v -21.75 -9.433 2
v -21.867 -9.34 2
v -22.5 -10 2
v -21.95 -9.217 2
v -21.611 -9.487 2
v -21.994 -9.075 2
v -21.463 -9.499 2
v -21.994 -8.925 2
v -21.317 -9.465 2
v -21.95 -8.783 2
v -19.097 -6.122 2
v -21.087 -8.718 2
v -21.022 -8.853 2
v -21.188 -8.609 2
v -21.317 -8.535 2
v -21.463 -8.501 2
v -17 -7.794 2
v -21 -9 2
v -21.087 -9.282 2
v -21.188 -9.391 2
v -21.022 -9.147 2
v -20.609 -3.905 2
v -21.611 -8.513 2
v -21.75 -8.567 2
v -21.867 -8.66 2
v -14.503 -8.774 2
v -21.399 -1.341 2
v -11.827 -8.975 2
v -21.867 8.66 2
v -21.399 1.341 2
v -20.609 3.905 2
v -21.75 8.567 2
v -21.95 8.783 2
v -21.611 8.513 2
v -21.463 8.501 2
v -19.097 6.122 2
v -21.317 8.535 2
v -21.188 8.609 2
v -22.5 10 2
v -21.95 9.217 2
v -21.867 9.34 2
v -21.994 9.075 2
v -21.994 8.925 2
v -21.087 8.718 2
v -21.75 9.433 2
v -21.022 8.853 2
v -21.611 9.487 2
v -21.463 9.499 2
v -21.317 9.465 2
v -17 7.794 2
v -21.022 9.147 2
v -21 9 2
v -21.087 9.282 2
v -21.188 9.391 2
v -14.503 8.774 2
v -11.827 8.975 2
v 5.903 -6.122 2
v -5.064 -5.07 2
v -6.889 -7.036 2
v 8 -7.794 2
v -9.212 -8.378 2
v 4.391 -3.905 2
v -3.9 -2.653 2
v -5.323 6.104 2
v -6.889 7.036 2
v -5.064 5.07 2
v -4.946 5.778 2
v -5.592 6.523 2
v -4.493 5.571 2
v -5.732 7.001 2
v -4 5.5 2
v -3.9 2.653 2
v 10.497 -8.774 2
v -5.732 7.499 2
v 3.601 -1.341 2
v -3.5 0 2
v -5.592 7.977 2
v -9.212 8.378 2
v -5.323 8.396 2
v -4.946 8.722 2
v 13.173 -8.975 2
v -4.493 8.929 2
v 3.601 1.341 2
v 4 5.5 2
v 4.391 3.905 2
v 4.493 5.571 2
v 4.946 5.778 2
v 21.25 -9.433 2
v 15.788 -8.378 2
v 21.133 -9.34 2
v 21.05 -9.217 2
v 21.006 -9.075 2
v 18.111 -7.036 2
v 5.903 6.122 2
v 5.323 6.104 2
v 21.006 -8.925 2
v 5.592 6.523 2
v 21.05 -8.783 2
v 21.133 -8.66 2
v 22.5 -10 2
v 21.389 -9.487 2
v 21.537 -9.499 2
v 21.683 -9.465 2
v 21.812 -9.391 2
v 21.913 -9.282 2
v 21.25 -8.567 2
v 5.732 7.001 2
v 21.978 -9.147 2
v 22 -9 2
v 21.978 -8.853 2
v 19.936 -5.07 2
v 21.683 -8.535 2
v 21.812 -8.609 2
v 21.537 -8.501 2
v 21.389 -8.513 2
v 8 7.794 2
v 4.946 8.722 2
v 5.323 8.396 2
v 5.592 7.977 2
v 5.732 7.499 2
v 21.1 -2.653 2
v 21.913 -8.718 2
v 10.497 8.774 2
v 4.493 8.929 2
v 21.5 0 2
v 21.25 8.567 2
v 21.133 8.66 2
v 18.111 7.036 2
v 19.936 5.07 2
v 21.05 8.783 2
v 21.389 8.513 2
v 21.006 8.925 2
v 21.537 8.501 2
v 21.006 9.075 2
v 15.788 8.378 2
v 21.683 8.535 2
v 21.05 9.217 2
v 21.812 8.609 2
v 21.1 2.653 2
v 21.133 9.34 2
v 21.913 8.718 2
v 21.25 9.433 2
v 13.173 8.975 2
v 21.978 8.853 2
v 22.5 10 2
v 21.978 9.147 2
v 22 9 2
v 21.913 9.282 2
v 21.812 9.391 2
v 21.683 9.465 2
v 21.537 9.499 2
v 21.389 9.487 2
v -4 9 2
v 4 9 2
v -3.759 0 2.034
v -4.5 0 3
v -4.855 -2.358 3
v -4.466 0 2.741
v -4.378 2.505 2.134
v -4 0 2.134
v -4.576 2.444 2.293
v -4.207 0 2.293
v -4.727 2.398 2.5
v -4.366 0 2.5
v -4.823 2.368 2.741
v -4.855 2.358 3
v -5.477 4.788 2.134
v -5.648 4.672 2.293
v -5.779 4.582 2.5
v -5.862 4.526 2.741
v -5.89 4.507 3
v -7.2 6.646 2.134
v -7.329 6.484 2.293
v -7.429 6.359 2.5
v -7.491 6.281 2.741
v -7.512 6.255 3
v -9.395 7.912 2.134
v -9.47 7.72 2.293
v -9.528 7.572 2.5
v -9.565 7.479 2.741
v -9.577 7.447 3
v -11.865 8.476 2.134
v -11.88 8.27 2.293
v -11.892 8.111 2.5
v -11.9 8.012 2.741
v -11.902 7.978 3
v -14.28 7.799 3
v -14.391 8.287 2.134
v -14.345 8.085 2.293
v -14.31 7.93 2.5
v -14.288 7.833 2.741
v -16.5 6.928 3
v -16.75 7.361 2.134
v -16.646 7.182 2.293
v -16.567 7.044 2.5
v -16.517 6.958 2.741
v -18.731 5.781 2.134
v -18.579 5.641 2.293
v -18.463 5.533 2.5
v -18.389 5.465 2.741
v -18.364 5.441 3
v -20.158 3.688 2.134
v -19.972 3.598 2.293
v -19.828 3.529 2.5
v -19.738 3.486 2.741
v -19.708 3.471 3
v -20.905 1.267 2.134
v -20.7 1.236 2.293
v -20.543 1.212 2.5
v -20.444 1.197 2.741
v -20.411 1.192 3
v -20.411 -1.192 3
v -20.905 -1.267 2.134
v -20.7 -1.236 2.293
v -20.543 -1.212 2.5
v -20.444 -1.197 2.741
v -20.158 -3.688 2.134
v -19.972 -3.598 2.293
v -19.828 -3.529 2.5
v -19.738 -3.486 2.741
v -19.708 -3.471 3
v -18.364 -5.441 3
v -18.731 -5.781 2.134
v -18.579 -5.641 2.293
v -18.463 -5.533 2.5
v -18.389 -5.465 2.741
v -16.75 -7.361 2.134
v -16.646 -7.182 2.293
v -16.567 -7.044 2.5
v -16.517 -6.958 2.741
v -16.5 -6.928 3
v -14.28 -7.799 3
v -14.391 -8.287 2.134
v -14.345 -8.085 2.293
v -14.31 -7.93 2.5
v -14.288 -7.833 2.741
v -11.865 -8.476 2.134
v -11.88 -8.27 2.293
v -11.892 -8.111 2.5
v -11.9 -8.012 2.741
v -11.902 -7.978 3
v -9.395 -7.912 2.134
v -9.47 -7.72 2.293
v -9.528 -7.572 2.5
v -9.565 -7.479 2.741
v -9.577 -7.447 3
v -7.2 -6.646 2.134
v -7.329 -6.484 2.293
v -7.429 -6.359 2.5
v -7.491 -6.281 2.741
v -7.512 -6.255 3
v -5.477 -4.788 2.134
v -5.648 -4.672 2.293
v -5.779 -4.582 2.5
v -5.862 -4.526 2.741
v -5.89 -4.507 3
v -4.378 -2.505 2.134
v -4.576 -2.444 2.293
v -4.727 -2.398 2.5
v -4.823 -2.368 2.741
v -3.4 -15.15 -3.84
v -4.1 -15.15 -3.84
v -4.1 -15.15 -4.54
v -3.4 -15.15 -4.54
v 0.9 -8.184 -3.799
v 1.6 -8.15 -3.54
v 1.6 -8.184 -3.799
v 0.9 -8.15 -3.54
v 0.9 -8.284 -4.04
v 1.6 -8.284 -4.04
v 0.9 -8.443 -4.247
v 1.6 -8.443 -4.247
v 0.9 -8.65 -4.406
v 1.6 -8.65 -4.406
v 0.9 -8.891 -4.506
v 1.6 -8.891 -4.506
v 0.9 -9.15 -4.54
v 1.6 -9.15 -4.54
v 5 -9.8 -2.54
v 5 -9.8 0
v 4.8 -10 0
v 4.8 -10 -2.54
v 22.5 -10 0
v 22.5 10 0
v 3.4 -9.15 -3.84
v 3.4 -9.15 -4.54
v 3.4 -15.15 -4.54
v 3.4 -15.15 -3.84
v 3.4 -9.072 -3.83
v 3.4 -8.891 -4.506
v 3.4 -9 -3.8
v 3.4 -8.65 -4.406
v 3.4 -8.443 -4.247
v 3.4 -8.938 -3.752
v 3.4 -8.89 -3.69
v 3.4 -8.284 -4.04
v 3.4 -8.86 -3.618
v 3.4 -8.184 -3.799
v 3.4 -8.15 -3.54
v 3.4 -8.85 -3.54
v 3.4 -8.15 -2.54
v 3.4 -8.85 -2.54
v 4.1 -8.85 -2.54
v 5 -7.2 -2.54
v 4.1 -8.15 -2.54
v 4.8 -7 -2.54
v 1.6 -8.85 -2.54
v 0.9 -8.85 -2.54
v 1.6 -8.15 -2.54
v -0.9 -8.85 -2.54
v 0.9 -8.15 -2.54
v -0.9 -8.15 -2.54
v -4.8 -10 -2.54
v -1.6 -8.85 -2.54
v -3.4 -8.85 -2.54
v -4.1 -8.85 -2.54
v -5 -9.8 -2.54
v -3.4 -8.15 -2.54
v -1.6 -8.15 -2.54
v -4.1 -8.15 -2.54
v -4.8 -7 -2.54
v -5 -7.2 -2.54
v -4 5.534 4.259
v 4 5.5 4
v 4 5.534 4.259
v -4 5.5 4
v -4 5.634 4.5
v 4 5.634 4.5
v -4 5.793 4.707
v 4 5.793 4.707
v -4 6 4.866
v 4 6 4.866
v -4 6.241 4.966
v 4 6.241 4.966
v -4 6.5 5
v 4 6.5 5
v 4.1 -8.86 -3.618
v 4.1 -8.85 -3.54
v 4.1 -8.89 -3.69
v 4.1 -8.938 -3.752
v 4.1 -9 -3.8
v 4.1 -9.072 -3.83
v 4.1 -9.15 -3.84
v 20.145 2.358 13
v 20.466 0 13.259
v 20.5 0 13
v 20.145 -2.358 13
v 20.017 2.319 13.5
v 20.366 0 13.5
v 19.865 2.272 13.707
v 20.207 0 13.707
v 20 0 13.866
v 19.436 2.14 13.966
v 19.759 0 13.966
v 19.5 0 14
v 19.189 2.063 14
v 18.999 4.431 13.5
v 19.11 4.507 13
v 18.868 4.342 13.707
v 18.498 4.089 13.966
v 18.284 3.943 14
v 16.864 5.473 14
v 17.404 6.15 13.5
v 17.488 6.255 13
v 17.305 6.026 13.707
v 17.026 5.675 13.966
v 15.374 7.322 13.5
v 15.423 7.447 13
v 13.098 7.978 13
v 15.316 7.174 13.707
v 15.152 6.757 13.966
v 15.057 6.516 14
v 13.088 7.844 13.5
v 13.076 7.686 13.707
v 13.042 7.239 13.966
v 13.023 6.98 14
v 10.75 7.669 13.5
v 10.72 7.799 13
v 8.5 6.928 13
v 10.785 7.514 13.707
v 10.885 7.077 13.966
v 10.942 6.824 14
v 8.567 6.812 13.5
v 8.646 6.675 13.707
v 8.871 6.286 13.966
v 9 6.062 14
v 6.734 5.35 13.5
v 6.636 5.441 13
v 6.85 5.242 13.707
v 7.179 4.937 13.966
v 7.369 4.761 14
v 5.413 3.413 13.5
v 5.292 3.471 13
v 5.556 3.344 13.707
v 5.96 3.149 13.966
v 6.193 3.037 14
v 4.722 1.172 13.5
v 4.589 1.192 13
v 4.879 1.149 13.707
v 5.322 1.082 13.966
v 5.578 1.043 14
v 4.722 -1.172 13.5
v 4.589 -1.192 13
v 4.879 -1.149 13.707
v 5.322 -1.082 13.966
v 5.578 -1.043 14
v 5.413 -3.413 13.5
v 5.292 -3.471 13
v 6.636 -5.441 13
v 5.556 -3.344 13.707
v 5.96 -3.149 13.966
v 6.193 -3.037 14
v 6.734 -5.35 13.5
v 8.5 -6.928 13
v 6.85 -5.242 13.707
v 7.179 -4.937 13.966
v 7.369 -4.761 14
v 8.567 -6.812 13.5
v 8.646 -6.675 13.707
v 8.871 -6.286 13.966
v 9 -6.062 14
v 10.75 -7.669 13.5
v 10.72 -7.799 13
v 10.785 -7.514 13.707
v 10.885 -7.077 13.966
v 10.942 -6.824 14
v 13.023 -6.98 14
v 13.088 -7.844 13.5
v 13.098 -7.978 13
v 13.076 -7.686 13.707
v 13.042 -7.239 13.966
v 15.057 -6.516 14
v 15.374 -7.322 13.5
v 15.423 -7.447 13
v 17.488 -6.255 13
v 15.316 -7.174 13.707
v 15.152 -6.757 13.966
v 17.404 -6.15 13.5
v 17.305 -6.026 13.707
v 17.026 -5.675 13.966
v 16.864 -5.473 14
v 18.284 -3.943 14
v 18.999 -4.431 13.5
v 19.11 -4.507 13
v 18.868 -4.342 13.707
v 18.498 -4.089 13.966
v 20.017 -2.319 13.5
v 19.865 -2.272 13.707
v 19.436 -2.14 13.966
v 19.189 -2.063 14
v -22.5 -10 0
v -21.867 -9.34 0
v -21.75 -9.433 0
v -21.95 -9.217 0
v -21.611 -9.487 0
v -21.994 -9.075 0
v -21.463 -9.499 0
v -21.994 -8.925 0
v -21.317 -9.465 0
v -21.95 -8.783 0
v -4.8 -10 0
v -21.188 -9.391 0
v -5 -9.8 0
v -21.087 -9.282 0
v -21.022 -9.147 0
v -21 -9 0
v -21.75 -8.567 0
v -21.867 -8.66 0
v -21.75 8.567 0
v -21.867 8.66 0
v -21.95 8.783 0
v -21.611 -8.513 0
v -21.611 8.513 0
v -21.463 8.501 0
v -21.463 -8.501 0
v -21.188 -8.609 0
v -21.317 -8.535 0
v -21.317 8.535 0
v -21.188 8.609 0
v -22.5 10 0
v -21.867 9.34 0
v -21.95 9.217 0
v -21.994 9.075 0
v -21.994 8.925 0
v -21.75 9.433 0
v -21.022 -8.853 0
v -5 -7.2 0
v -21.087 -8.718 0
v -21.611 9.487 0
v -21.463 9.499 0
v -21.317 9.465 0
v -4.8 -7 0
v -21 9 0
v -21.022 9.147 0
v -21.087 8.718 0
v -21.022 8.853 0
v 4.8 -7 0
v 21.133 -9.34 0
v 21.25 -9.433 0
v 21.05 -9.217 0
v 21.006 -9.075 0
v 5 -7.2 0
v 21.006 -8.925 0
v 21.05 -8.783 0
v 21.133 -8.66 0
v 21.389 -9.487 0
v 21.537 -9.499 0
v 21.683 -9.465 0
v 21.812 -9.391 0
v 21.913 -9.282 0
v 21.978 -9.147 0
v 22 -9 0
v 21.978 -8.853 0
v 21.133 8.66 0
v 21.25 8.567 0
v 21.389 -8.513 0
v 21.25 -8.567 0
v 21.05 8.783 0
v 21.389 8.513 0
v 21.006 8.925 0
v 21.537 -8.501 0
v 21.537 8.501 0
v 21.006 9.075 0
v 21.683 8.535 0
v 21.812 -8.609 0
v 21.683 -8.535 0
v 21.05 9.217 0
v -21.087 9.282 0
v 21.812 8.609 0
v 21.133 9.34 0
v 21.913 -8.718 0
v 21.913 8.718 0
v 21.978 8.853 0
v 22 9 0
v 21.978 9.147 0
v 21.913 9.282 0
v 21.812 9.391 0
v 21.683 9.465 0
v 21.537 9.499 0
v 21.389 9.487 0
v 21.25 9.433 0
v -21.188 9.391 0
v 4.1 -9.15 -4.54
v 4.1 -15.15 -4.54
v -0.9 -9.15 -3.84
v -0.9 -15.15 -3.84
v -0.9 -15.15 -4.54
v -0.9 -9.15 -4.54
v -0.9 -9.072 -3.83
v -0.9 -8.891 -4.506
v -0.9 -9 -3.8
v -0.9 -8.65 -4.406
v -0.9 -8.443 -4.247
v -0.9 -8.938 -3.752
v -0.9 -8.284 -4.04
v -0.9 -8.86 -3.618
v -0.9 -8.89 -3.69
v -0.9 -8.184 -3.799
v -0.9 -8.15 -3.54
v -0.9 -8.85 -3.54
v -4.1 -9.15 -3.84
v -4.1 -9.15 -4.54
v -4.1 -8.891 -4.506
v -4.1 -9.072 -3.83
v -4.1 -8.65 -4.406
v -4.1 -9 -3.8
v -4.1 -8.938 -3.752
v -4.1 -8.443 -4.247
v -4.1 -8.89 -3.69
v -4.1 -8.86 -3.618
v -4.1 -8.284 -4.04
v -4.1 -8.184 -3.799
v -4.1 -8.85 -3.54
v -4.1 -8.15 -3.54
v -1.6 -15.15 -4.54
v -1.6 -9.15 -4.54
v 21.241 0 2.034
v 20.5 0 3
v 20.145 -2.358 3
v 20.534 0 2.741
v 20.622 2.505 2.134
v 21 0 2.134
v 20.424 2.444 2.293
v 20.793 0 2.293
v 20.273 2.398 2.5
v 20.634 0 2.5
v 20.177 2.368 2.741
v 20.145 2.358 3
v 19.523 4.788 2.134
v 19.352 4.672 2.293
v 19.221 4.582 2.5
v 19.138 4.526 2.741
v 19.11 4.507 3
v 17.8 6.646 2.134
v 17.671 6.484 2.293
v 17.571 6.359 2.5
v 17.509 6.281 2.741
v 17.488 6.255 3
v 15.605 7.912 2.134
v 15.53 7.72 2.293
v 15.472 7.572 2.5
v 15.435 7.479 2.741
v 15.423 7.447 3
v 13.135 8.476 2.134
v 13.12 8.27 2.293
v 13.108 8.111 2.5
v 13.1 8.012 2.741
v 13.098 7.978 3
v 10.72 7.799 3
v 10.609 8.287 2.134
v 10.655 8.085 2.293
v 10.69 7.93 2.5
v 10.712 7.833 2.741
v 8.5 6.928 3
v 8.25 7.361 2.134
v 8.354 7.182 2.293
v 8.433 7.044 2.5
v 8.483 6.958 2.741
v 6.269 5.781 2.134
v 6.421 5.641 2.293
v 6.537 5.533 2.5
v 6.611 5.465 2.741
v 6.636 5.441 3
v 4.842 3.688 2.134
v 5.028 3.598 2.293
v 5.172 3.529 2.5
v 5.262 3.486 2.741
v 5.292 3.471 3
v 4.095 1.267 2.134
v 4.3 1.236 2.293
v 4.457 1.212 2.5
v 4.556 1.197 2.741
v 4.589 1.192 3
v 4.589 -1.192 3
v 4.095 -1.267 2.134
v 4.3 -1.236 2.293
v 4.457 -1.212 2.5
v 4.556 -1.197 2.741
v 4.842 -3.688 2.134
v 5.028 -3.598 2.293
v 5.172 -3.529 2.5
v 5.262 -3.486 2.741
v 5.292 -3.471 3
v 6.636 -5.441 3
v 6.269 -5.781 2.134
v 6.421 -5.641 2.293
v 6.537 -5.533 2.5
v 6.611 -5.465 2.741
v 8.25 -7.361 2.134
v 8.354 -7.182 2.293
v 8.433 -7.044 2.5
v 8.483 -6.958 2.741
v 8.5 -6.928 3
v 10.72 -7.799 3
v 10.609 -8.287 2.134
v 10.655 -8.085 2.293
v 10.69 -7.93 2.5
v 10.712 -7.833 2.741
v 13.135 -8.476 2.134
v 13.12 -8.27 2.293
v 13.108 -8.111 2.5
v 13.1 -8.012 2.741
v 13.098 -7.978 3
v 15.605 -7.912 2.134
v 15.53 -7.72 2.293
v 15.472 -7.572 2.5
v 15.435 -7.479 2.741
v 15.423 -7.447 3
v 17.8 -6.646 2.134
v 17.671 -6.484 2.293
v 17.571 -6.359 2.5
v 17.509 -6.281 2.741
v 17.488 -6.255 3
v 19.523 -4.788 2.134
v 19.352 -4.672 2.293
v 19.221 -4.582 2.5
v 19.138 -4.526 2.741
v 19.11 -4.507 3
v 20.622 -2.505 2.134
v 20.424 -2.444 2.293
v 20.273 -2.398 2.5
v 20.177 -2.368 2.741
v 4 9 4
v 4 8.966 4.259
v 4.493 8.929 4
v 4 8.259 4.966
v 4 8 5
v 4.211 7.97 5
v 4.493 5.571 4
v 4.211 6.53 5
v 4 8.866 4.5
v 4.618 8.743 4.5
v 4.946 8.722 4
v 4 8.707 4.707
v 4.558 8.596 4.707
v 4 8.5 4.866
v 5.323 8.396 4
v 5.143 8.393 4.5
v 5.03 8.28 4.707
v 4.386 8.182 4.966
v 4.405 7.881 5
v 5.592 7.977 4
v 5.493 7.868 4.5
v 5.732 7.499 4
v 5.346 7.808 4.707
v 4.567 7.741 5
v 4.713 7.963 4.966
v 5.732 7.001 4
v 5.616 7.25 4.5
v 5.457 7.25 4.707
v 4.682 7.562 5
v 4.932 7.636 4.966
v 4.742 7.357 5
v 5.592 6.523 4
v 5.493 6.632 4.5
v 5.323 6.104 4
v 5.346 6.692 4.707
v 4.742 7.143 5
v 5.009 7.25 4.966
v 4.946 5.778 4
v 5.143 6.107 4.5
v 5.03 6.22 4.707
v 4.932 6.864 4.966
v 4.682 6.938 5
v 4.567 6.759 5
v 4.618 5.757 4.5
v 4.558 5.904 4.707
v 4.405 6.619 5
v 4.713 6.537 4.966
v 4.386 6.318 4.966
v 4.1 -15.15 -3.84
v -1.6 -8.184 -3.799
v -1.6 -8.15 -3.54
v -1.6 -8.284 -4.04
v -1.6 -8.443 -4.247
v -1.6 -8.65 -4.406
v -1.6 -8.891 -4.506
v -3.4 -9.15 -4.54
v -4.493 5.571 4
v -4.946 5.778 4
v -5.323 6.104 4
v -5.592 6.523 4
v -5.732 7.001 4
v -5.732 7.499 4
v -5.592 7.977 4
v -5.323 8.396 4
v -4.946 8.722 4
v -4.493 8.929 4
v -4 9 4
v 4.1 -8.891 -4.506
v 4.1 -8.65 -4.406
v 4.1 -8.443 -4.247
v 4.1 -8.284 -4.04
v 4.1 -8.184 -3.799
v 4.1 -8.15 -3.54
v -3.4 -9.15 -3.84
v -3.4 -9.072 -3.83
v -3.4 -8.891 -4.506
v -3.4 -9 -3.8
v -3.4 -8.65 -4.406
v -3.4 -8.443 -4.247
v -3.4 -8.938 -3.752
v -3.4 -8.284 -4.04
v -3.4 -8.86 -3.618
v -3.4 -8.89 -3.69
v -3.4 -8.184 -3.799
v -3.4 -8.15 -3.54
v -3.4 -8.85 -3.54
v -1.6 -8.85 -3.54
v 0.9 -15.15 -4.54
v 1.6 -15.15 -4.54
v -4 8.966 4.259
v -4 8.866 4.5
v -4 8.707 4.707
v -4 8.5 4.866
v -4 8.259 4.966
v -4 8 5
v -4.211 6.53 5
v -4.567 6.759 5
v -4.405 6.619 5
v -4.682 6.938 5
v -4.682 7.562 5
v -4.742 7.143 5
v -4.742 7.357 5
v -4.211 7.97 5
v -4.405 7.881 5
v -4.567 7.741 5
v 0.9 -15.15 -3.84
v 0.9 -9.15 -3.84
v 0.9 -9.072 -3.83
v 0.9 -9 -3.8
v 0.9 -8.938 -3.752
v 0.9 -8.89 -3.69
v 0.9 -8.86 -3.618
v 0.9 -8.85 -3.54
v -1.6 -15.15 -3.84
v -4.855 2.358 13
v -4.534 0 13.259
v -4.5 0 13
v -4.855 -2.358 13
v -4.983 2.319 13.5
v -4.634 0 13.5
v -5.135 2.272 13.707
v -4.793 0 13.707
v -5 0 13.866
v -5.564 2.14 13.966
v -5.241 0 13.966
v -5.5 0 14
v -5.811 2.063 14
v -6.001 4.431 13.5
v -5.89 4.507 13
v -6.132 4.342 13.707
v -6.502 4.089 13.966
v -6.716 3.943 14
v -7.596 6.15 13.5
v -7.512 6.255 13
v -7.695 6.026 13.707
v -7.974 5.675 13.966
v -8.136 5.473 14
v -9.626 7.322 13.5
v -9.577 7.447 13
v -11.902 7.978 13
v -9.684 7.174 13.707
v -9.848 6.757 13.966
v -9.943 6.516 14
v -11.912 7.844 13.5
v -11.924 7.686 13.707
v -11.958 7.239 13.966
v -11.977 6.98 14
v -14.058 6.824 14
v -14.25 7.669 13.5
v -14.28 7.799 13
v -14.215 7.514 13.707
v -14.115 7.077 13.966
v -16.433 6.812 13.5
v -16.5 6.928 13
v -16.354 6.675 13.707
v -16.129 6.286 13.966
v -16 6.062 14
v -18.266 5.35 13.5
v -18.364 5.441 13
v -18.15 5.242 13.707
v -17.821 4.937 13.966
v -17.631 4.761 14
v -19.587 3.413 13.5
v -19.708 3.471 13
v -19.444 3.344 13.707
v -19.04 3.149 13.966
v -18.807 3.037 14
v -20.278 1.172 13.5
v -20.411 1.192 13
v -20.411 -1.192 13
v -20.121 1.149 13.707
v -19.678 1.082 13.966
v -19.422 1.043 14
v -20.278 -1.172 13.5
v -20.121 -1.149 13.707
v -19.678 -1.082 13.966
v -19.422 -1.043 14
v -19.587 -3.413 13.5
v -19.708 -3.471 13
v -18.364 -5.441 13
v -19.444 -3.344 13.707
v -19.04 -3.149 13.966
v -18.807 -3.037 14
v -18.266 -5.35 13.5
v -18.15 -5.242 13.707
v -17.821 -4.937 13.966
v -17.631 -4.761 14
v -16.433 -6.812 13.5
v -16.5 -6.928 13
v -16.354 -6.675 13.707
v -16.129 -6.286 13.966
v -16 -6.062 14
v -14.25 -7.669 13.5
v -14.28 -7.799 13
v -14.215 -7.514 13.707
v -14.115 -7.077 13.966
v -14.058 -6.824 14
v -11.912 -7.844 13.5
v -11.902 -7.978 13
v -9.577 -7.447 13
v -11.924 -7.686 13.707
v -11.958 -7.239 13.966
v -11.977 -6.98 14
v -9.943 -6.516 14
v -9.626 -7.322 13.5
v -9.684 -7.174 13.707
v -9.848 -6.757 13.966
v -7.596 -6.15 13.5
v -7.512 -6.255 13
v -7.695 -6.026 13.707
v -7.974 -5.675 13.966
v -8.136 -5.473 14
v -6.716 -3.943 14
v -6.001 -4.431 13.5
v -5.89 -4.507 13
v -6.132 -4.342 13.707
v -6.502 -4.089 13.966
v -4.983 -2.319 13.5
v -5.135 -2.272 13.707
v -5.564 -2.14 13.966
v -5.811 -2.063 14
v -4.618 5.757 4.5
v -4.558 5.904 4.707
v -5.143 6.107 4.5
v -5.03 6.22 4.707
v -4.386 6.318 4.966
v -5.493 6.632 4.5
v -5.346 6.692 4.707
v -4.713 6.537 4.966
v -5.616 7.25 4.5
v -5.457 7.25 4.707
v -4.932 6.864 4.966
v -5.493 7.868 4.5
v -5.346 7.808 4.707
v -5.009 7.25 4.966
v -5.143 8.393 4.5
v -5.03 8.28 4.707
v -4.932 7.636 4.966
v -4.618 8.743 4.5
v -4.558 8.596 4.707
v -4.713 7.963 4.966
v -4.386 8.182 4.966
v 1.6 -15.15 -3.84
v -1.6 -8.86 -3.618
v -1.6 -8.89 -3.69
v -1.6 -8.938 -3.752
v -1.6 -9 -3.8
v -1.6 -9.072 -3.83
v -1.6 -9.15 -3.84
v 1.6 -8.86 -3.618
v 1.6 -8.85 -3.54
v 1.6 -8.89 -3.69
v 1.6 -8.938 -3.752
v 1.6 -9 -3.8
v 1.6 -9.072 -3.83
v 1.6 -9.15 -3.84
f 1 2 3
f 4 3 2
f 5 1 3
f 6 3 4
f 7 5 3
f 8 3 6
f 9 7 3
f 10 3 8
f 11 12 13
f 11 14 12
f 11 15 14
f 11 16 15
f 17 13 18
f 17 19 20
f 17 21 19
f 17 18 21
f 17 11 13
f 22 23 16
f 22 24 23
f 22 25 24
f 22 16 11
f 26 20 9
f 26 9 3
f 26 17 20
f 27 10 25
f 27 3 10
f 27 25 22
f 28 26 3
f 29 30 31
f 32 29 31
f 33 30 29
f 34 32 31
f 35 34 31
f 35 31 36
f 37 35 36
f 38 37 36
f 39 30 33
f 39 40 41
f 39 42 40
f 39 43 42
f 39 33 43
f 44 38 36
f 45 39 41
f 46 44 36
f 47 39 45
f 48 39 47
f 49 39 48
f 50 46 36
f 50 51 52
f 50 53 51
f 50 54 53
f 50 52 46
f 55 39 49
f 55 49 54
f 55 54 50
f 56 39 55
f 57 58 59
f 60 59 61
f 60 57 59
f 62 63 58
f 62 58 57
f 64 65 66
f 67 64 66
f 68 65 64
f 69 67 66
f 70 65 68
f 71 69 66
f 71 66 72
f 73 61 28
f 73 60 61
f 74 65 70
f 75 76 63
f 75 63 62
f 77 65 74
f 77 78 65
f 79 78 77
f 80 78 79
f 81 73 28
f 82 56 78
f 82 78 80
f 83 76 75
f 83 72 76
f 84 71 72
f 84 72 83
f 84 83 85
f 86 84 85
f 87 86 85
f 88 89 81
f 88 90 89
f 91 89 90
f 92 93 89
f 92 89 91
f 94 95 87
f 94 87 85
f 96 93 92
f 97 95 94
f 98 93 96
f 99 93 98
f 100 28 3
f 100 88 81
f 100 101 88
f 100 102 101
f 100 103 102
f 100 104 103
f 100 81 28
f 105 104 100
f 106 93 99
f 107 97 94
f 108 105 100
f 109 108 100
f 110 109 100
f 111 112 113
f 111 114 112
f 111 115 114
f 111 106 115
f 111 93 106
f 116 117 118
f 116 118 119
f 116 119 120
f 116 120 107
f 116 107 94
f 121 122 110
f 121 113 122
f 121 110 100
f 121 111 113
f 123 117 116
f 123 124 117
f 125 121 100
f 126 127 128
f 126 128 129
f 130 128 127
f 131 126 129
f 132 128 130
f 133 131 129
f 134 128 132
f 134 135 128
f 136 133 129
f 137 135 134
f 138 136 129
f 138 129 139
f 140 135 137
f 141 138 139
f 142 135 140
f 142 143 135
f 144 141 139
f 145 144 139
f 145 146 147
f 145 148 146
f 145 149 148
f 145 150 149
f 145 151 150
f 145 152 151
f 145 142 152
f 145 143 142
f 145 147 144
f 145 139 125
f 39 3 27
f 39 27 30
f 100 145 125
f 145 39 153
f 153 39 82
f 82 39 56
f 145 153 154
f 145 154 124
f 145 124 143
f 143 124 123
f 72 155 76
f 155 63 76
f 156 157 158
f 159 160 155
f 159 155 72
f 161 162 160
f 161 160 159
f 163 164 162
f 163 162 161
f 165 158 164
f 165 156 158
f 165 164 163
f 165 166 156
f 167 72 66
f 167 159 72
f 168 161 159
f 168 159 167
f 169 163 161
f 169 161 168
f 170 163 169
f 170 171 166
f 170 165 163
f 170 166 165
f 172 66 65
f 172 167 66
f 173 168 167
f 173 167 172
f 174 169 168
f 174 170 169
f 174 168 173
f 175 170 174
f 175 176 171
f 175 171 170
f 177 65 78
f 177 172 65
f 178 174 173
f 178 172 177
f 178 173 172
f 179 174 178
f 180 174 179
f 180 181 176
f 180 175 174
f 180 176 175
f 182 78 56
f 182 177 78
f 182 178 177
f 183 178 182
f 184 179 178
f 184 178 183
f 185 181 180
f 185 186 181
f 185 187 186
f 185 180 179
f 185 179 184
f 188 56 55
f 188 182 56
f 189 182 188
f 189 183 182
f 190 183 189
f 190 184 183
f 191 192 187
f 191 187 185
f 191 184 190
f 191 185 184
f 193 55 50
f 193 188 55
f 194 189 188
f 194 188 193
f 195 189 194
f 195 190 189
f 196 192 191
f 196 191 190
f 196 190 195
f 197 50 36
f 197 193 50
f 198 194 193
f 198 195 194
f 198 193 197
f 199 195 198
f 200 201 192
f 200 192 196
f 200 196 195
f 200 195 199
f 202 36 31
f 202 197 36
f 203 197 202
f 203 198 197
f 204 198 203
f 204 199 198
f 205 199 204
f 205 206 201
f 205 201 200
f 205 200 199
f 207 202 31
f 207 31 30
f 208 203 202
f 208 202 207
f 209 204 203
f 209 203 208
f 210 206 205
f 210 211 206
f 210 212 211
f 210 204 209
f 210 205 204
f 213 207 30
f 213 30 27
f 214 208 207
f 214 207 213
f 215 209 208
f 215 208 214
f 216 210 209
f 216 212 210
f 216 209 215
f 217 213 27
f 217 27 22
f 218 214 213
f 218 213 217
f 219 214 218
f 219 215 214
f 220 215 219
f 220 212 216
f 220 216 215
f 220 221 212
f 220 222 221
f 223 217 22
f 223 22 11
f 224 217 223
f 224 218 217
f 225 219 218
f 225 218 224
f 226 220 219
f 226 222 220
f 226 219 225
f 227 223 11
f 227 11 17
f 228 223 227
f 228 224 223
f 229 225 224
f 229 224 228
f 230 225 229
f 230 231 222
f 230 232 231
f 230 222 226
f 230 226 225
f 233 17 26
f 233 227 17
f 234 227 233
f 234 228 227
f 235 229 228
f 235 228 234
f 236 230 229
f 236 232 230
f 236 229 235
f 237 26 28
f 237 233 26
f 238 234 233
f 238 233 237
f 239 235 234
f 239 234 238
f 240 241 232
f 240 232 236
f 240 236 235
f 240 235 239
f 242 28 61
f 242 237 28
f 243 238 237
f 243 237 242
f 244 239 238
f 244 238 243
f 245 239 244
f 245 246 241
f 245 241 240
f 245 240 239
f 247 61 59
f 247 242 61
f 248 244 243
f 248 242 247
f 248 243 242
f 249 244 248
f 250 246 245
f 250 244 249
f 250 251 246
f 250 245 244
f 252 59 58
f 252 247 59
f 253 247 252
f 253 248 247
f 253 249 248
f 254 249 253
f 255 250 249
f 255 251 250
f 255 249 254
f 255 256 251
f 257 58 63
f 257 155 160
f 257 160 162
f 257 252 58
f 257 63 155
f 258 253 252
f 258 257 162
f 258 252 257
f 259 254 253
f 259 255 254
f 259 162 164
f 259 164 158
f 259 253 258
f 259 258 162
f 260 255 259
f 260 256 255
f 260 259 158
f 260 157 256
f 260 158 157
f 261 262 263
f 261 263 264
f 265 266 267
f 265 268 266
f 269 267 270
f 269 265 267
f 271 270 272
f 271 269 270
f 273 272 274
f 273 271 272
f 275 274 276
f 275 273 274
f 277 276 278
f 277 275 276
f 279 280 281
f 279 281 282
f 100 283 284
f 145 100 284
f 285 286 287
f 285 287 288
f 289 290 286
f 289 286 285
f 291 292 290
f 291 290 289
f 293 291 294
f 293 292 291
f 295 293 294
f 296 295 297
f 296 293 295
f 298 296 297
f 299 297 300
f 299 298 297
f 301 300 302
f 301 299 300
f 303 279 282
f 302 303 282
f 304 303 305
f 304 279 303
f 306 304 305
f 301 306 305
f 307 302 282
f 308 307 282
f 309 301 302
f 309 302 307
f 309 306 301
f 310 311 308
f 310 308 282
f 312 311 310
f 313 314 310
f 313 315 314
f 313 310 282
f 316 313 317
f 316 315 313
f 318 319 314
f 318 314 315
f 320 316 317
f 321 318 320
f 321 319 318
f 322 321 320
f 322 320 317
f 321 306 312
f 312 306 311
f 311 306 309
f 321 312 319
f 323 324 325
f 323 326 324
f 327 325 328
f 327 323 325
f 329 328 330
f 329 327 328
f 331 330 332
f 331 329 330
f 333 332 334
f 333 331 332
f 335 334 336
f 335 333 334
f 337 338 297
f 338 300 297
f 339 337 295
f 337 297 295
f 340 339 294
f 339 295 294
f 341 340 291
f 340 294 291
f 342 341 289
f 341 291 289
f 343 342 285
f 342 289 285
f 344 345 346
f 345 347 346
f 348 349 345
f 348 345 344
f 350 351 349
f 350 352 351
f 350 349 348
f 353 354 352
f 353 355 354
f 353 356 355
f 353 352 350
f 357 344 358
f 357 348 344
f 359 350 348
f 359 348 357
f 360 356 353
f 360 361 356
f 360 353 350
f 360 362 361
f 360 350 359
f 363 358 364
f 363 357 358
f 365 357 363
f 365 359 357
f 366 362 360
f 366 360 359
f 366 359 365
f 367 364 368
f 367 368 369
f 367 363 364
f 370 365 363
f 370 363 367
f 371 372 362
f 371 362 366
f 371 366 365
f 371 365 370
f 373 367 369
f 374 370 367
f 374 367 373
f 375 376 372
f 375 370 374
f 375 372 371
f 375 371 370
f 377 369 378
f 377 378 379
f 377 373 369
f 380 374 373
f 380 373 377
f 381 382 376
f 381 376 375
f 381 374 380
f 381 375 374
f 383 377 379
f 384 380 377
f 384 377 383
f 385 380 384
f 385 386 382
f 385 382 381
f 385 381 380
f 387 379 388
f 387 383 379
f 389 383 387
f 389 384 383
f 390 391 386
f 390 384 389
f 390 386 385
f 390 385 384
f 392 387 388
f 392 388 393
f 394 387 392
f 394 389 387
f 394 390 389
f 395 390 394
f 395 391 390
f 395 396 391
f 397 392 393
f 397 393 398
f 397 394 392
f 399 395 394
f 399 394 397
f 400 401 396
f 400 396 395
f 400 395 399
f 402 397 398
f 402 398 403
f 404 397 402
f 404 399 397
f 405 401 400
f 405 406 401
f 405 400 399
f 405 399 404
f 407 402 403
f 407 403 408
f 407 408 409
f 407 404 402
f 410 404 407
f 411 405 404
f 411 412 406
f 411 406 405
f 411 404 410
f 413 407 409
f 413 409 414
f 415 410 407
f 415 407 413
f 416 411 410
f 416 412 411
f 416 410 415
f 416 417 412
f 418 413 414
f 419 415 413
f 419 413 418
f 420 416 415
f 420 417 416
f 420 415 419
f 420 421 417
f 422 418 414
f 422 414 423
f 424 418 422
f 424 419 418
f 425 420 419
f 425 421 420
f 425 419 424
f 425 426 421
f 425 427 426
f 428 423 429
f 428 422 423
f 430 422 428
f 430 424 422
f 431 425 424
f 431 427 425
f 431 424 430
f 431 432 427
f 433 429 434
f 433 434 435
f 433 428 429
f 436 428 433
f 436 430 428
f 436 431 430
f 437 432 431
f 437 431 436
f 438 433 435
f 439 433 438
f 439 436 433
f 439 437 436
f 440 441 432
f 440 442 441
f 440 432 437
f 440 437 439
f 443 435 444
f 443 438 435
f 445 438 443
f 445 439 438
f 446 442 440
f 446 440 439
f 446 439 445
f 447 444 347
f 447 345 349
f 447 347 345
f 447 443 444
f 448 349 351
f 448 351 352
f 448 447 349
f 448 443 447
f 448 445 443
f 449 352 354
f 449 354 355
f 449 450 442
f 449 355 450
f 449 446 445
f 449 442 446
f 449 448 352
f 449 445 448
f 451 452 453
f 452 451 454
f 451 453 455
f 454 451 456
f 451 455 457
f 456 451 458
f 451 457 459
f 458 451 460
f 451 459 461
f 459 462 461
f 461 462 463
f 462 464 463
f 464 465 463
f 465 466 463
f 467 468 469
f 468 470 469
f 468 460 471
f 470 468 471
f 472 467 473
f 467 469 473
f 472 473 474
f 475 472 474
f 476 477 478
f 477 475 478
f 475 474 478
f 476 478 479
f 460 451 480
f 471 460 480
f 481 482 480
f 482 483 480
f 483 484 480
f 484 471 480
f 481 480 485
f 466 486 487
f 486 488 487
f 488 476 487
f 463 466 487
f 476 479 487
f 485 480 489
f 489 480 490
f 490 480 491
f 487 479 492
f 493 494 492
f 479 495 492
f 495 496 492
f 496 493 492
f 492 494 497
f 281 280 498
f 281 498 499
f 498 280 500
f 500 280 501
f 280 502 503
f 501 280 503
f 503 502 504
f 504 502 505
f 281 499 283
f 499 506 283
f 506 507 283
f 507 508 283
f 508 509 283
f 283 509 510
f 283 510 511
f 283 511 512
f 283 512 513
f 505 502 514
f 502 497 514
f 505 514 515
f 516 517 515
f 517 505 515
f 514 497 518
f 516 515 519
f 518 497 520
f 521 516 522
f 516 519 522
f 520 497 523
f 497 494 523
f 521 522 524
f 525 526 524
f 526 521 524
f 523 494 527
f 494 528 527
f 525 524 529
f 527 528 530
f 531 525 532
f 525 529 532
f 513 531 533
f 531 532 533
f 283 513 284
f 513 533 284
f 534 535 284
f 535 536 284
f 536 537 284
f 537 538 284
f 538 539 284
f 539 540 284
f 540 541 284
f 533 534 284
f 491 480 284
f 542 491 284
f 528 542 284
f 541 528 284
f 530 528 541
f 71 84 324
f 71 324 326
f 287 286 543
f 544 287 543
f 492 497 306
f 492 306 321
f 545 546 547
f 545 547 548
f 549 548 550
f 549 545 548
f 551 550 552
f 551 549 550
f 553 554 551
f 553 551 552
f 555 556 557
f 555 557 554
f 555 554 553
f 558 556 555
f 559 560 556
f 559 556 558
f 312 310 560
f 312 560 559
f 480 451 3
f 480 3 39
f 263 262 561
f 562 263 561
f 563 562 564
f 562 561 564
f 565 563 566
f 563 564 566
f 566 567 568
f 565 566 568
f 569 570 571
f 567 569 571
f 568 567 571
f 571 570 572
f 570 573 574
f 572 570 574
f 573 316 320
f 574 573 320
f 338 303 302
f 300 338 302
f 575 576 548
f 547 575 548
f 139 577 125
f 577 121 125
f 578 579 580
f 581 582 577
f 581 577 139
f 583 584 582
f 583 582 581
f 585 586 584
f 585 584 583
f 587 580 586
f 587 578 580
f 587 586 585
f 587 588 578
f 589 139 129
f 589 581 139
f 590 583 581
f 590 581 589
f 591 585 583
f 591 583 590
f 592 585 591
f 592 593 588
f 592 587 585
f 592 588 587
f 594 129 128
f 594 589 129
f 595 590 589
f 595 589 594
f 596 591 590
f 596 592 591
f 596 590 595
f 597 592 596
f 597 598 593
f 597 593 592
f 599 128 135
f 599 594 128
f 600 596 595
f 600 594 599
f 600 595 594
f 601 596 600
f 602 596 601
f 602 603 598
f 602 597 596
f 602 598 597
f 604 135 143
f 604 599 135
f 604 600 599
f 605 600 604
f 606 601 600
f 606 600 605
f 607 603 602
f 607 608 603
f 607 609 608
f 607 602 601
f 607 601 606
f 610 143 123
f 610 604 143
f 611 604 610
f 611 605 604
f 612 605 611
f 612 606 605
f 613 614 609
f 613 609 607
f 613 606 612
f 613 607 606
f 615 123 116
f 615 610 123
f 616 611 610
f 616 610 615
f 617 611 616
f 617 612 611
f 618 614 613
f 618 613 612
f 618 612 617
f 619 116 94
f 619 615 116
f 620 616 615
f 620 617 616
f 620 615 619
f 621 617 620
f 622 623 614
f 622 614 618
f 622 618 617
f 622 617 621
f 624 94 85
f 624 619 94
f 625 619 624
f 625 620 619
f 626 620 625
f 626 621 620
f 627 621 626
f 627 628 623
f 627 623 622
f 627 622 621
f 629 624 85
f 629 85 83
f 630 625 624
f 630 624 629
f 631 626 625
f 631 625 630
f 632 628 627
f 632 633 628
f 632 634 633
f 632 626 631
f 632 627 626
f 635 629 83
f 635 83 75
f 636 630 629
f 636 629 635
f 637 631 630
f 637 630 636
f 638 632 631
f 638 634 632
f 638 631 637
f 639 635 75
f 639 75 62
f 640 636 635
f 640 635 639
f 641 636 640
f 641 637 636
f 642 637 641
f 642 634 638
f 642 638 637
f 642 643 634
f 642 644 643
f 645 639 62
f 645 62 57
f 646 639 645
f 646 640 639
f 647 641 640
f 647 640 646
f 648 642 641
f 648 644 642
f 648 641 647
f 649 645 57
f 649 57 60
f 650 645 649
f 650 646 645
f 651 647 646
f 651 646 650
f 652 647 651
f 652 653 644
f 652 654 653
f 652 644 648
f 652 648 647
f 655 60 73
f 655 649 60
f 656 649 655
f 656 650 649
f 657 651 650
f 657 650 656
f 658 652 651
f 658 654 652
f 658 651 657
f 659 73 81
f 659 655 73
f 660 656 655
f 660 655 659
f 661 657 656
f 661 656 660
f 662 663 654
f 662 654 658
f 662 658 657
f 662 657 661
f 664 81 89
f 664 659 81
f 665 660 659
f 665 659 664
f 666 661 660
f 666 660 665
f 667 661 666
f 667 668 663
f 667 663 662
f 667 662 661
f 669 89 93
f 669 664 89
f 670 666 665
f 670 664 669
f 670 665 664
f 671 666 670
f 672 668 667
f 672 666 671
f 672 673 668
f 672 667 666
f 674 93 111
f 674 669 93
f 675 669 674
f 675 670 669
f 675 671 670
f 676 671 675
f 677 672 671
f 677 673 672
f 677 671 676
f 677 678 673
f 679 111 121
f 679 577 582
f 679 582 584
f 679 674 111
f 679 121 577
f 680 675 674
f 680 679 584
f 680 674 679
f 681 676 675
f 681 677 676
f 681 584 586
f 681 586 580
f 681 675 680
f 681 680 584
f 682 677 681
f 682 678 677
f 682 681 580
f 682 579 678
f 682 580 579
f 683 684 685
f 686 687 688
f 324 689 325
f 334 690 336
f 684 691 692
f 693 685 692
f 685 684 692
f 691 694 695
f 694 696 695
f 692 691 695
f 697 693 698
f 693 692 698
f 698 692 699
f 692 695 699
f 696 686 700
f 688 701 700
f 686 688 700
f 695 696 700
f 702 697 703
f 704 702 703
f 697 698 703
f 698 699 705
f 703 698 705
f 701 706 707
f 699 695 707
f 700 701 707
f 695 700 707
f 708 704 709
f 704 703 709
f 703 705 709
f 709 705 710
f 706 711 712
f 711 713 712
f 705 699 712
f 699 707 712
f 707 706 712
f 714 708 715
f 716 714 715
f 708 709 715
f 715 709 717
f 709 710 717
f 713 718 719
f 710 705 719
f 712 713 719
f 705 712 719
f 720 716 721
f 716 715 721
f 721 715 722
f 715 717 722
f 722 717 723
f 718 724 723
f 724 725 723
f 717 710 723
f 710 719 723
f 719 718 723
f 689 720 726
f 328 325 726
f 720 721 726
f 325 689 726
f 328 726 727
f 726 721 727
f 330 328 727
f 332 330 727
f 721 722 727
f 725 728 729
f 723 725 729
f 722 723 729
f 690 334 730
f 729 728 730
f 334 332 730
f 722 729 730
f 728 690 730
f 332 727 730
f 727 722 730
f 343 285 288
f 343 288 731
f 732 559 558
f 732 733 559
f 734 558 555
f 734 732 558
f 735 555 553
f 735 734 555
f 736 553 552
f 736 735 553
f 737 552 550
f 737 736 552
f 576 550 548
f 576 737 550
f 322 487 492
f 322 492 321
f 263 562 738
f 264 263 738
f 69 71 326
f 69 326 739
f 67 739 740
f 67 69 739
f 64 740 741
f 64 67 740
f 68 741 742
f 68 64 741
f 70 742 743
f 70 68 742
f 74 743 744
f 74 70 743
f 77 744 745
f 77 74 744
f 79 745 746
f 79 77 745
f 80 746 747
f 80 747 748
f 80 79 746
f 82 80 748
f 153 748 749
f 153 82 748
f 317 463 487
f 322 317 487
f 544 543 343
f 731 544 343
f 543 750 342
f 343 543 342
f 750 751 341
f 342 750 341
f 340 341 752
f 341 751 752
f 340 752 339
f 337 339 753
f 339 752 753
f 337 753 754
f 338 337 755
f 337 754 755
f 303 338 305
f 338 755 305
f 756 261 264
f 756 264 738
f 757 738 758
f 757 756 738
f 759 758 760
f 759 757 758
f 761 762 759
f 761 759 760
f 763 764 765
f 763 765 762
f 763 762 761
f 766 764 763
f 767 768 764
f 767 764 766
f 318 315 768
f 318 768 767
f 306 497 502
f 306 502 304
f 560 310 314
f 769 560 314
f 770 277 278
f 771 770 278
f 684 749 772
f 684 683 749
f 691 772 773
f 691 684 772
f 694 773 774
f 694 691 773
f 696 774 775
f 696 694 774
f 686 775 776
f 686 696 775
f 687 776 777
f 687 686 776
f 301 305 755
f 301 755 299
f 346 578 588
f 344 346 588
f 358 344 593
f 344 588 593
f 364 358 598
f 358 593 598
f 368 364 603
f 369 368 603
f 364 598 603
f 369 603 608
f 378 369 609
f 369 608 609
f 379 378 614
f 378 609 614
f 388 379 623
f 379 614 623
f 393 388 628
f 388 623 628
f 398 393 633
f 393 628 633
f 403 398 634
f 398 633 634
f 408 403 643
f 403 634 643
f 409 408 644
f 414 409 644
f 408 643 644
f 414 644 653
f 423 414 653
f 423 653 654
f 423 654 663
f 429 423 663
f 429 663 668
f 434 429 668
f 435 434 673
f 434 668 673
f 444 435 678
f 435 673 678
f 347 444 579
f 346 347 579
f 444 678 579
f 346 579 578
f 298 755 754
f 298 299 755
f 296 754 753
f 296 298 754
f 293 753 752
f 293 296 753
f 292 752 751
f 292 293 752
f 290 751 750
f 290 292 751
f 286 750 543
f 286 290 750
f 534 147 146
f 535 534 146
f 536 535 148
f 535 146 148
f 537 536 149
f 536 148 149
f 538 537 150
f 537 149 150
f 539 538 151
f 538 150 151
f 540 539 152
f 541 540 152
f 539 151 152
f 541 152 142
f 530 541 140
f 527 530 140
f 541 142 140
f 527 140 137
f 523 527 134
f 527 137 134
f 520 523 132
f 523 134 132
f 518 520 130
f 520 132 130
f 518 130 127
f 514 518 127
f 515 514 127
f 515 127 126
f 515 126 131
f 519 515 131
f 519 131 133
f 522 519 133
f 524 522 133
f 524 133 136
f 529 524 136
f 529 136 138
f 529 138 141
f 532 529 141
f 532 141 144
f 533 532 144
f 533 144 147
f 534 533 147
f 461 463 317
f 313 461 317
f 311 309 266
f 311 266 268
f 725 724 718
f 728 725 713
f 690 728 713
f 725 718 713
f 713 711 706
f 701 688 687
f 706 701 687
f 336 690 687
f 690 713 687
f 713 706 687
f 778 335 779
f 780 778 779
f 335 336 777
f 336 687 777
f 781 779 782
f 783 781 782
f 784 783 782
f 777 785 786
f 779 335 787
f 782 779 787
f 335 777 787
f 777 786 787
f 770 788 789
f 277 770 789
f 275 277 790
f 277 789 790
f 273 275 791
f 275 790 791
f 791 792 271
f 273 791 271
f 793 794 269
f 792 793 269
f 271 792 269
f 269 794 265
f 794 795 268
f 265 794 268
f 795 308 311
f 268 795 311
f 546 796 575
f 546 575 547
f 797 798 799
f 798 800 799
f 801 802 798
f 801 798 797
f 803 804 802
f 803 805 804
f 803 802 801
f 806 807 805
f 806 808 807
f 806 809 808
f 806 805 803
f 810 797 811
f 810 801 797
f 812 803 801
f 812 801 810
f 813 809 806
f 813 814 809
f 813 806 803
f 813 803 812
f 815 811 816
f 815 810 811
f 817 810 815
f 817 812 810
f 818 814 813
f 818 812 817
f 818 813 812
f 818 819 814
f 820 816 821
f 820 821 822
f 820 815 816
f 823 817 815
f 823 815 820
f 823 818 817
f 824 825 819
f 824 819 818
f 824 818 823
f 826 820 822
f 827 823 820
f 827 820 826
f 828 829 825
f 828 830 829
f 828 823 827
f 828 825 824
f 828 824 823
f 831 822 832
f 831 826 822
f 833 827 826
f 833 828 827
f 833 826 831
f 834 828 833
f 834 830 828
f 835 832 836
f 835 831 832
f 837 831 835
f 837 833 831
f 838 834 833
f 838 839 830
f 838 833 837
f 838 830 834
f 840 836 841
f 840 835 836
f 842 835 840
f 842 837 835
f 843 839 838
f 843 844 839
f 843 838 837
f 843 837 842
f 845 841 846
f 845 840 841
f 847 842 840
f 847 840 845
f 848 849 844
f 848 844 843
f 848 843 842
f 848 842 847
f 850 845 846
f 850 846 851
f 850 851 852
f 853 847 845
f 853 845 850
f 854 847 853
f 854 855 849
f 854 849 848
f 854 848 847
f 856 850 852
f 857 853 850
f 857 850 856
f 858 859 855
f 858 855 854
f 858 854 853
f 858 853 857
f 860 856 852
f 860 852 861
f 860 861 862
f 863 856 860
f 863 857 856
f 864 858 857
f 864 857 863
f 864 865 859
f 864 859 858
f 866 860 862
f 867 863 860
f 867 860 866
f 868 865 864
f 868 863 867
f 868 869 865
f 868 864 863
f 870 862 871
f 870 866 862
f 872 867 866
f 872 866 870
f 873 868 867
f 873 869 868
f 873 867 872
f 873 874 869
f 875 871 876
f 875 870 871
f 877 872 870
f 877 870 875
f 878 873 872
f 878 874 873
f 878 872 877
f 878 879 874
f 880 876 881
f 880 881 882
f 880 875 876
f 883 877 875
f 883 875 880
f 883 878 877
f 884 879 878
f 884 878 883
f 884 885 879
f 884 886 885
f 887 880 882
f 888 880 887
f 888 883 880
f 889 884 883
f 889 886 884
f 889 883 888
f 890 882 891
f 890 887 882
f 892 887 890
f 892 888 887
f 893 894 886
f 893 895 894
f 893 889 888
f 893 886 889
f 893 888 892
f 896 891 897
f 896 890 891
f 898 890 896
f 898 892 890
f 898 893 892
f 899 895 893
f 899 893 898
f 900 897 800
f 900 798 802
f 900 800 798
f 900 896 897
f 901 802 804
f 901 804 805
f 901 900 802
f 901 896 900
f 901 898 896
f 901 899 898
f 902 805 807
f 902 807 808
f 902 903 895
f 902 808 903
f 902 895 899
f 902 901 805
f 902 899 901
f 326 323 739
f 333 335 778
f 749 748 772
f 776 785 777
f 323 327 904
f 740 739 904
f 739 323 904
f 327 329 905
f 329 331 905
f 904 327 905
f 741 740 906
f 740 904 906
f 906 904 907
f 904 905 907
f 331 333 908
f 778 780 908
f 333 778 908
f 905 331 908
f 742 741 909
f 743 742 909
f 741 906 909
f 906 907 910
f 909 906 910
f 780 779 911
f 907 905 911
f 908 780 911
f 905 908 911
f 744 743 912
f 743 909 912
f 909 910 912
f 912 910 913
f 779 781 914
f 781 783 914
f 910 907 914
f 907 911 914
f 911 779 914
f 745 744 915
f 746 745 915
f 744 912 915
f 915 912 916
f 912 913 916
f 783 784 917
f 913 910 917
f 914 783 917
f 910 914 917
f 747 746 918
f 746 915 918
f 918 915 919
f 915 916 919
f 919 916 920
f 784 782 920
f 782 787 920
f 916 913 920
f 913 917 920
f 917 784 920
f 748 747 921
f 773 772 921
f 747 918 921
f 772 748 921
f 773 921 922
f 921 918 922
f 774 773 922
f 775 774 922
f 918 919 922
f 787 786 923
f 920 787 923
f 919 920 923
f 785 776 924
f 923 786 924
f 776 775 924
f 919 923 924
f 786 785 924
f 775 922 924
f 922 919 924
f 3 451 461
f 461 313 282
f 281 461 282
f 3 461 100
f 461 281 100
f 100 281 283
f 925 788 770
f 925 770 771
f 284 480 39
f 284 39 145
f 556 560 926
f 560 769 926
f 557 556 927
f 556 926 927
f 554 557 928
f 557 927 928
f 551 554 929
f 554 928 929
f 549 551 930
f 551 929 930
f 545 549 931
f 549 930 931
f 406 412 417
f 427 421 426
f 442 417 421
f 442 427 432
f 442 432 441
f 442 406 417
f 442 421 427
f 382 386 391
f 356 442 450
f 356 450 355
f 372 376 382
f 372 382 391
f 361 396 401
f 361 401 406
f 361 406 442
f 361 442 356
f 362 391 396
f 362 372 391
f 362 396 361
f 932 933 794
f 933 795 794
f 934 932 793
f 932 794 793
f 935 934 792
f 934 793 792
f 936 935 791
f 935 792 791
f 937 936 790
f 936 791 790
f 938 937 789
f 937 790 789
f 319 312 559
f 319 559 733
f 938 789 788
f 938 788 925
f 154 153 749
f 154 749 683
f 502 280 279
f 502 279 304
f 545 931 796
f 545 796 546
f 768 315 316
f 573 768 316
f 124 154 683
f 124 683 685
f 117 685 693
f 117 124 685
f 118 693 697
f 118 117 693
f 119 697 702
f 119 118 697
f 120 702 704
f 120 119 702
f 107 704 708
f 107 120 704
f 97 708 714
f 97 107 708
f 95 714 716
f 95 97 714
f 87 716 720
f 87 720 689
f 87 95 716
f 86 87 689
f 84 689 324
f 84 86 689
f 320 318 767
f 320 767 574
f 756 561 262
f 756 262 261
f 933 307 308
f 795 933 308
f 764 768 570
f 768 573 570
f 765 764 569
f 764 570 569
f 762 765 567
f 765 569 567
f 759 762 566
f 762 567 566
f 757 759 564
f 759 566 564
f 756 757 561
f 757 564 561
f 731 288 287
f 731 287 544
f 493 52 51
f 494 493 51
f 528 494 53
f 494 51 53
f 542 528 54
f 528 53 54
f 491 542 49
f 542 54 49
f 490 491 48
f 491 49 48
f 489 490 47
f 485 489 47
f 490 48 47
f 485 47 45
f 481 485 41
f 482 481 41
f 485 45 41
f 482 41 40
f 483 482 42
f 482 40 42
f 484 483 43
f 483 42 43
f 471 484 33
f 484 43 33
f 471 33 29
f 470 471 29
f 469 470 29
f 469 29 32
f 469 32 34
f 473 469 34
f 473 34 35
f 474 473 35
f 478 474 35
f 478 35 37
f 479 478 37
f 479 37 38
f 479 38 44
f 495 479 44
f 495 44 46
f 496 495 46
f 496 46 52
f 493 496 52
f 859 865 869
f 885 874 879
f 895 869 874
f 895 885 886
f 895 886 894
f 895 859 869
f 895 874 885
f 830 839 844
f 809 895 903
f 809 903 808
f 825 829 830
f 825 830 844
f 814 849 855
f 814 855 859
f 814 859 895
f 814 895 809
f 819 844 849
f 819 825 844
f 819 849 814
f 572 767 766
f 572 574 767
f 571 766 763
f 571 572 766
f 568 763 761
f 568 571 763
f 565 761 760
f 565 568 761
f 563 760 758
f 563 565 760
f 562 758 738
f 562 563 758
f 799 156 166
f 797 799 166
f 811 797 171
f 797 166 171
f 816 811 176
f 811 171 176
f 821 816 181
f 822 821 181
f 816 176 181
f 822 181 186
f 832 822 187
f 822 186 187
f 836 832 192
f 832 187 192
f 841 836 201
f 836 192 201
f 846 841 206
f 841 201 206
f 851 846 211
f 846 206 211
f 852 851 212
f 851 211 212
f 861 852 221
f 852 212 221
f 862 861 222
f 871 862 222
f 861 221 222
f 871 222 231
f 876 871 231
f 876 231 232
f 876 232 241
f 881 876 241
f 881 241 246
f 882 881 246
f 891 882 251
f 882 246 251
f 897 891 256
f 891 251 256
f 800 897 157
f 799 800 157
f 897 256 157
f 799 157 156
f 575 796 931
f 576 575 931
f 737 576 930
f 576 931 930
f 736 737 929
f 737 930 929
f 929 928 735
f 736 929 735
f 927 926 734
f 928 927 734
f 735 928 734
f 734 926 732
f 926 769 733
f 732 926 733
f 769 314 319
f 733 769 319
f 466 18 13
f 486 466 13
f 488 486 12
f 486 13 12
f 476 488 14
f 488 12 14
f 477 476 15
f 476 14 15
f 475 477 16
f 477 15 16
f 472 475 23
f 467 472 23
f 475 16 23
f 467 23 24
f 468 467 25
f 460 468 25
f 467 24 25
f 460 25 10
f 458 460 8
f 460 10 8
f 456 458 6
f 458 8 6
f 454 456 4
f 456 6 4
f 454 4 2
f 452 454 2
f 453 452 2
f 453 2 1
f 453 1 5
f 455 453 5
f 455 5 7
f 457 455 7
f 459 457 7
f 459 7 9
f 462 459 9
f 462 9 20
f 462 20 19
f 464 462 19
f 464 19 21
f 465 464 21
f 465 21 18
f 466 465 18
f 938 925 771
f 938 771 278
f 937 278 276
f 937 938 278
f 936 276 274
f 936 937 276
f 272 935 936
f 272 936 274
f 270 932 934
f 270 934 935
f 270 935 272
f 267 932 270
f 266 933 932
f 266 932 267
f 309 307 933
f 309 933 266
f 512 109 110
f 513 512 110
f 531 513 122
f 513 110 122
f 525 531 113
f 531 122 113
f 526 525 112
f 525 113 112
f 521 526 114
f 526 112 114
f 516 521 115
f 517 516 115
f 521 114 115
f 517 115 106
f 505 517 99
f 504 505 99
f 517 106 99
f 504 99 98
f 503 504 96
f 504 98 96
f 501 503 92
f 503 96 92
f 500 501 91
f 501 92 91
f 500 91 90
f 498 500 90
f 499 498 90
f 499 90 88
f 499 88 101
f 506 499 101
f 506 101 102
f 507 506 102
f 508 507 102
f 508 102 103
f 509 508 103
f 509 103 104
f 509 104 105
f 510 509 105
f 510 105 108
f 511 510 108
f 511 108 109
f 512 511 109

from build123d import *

# Parameters (mm, degrees)
CROQUIS1_W              = 45
CROQUIS1_H              = 20
SALIENTE_EXTRUIR1_DEPTH = 2
CROQUIS2_R              = 8
SALIENTE_EXTRUIR2_DEPTH = 12
REDONDEO1_R             = 1
SALIENTE_EXTRUIR3_DEPTH = 3
REDONDEO2_R             = 1
CROQUIS4_R              = 0.5
CORTAR_EXTRUIR1_DEPTH   = 3
CROQUIS5_W              = 10
CROQUIS5_H              = 3
SALIENTE_EXTRUIR4_DEPTH = 2.54
CHAFL_N1_SIZE           = 0.2
CROQUIS6_W              = 0.7
CROQUIS6_H              = 0.7
SALIENTE_EXTRUIR5_DEPTH = 1
CROQUIS7_W              = 0.7
CROQUIS7_H              = 0.7
REVOLUCI_N1_ANGLE       = 90
CROQUIS8_W              = 0.7
CROQUIS8_H              = 0.7
SALIENTE_EXTRUIR6_DEPTH = 6


with BuildPart() as part:
    # Croquis1 → Saliente-Extruir1 (new body)
    with BuildSketch(Plane.XY):
        Rectangle(CROQUIS1_W, CROQUIS1_H)
    extrude(amount=SALIENTE_EXTRUIR1_DEPTH)

    # Croquis2 → Saliente-Extruir2 (add)
    with BuildSketch(Plane.XY.offset(2)):
        with Locations((12.5, 0)):
            Circle(CROQUIS2_R)
        with Locations((-12.5, 0)):
            Circle(CROQUIS2_R)
    extrude(amount=SALIENTE_EXTRUIR2_DEPTH)

    # Redondeo1
    redondeo1_edges = [part.edges().sort_by_distance(p)[0] for p in [
        (4.5, 0, 2),
        (4.5, 0, 14),
        (-20.5, 0, 2),
        (-20.5, 0, 14),
    ]]
    fillet(redondeo1_edges, radius=REDONDEO1_R)

    # Croquis3 → Saliente-Extruir3 (add)
    with BuildSketch(Plane.XY.offset(2)):
        with BuildLine():
            Line((4, 5.5), (-4, 5.5))
            ThreePointArc((-4, 5.5), (-5.75, 7.25), (-4, 9))
            Line((-4, 9), (4, 9))
            ThreePointArc((4, 9), (5.75, 7.25), (4, 5.5))
        make_face()
    extrude(amount=SALIENTE_EXTRUIR3_DEPTH)

    # Redondeo2
    redondeo2_edges = [part.edges().sort_by_distance(p)[0] for p in [
        (5.75, 7.25, 5),
        (0, 9, 5),
        (-5.75, 7.25, 5),
        (0, 5.5, 5),
    ]]
    fillet(redondeo2_edges, radius=REDONDEO2_R)

    # Croquis4 → Cortar-Extruir1 (cut, through all)
    with BuildSketch(Plane.XY.offset(2)):
        with Locations((21.5, 9)):
            Circle(CROQUIS4_R)
        with Locations((21.5, -9)):
            Circle(CROQUIS4_R)
        with Locations((-21.5, -9)):
            Circle(CROQUIS4_R)
        with Locations((-21.5, 9)):
            Circle(CROQUIS4_R)
    extrude(amount=-CORTAR_EXTRUIR1_DEPTH, mode=Mode.SUBTRACT)

    # Croquis5 → Saliente-Extruir4 (add)
    with BuildSketch(Plane(origin=(0, 0, 0), x_dir=(-1, 0, 0), z_dir=(0, 0, -1))):
        with Locations((0, -8.5)):
            Rectangle(CROQUIS5_W, CROQUIS5_H)
    extrude(amount=SALIENTE_EXTRUIR4_DEPTH)

    # Chaflán1
    chafl_n1_edges = [part.edges().sort_by_distance(p)[0] for p in [
        (5, -7, -1.27),
        (5, -10, -1.27),
        (-5, -10, -1.27),
        (-5, -7, -1.27),
    ]]
    chamfer(chafl_n1_edges, length=CHAFL_N1_SIZE)

    # Croquis6 → Saliente-Extruir5 (add)
    with BuildSketch(Plane(origin=(0, 0, -2.54), x_dir=(-1, 0, 0), z_dir=(0, 0, -1))):
        with Locations((-3.75, -8.5)):
            Rectangle(CROQUIS6_W, CROQUIS6_H)
        with Locations((-1.25, -8.5)):
            Rectangle(CROQUIS6_W, CROQUIS6_H)
        with Locations((1.25, -8.5)):
            Rectangle(CROQUIS6_W, CROQUIS6_H)
        with Locations((3.75, -8.5)):
            Rectangle(CROQUIS6_W, CROQUIS6_H)
    extrude(amount=SALIENTE_EXTRUIR5_DEPTH)

    # Croquis7 → Revolución1 (revolve)
    with BuildSketch(Plane(origin=(0, 0, -3.54), x_dir=(-1, 0, 0), z_dir=(0, 0, -1))):
        with Locations((-3.75, -8.5)):
            Rectangle(CROQUIS7_W, CROQUIS7_H)
        with Locations((-1.25, -8.5)):
            Rectangle(CROQUIS7_W, CROQUIS7_H)
        with Locations((1.25, -8.5)):
            Rectangle(CROQUIS7_W, CROQUIS7_H)
        with Locations((3.75, -8.5)):
            Rectangle(CROQUIS7_W, CROQUIS7_H)
    revolve(axis=Axis((4.1, -9.15, -3.54), (-1, 0, 0)), revolution_arc=REVOLUCI_N1_ANGLE)

    # Croquis8 → Saliente-Extruir6 (add)
    with BuildSketch(Plane.XZ.offset(9.15)):
        with Locations((3.75, -4.19)):
            Rectangle(CROQUIS8_W, CROQUIS8_H)
        with Locations((1.25, -4.19)):
            Rectangle(CROQUIS8_W, CROQUIS8_H)
        with Locations((-1.25, -4.19)):
            Rectangle(CROQUIS8_W, CROQUIS8_H)
        with Locations((-3.75, -4.19)):
            Rectangle(CROQUIS8_W, CROQUIS8_H)
    extrude(amount=SALIENTE_EXTRUIR6_DEPTH)


solid = part.part
